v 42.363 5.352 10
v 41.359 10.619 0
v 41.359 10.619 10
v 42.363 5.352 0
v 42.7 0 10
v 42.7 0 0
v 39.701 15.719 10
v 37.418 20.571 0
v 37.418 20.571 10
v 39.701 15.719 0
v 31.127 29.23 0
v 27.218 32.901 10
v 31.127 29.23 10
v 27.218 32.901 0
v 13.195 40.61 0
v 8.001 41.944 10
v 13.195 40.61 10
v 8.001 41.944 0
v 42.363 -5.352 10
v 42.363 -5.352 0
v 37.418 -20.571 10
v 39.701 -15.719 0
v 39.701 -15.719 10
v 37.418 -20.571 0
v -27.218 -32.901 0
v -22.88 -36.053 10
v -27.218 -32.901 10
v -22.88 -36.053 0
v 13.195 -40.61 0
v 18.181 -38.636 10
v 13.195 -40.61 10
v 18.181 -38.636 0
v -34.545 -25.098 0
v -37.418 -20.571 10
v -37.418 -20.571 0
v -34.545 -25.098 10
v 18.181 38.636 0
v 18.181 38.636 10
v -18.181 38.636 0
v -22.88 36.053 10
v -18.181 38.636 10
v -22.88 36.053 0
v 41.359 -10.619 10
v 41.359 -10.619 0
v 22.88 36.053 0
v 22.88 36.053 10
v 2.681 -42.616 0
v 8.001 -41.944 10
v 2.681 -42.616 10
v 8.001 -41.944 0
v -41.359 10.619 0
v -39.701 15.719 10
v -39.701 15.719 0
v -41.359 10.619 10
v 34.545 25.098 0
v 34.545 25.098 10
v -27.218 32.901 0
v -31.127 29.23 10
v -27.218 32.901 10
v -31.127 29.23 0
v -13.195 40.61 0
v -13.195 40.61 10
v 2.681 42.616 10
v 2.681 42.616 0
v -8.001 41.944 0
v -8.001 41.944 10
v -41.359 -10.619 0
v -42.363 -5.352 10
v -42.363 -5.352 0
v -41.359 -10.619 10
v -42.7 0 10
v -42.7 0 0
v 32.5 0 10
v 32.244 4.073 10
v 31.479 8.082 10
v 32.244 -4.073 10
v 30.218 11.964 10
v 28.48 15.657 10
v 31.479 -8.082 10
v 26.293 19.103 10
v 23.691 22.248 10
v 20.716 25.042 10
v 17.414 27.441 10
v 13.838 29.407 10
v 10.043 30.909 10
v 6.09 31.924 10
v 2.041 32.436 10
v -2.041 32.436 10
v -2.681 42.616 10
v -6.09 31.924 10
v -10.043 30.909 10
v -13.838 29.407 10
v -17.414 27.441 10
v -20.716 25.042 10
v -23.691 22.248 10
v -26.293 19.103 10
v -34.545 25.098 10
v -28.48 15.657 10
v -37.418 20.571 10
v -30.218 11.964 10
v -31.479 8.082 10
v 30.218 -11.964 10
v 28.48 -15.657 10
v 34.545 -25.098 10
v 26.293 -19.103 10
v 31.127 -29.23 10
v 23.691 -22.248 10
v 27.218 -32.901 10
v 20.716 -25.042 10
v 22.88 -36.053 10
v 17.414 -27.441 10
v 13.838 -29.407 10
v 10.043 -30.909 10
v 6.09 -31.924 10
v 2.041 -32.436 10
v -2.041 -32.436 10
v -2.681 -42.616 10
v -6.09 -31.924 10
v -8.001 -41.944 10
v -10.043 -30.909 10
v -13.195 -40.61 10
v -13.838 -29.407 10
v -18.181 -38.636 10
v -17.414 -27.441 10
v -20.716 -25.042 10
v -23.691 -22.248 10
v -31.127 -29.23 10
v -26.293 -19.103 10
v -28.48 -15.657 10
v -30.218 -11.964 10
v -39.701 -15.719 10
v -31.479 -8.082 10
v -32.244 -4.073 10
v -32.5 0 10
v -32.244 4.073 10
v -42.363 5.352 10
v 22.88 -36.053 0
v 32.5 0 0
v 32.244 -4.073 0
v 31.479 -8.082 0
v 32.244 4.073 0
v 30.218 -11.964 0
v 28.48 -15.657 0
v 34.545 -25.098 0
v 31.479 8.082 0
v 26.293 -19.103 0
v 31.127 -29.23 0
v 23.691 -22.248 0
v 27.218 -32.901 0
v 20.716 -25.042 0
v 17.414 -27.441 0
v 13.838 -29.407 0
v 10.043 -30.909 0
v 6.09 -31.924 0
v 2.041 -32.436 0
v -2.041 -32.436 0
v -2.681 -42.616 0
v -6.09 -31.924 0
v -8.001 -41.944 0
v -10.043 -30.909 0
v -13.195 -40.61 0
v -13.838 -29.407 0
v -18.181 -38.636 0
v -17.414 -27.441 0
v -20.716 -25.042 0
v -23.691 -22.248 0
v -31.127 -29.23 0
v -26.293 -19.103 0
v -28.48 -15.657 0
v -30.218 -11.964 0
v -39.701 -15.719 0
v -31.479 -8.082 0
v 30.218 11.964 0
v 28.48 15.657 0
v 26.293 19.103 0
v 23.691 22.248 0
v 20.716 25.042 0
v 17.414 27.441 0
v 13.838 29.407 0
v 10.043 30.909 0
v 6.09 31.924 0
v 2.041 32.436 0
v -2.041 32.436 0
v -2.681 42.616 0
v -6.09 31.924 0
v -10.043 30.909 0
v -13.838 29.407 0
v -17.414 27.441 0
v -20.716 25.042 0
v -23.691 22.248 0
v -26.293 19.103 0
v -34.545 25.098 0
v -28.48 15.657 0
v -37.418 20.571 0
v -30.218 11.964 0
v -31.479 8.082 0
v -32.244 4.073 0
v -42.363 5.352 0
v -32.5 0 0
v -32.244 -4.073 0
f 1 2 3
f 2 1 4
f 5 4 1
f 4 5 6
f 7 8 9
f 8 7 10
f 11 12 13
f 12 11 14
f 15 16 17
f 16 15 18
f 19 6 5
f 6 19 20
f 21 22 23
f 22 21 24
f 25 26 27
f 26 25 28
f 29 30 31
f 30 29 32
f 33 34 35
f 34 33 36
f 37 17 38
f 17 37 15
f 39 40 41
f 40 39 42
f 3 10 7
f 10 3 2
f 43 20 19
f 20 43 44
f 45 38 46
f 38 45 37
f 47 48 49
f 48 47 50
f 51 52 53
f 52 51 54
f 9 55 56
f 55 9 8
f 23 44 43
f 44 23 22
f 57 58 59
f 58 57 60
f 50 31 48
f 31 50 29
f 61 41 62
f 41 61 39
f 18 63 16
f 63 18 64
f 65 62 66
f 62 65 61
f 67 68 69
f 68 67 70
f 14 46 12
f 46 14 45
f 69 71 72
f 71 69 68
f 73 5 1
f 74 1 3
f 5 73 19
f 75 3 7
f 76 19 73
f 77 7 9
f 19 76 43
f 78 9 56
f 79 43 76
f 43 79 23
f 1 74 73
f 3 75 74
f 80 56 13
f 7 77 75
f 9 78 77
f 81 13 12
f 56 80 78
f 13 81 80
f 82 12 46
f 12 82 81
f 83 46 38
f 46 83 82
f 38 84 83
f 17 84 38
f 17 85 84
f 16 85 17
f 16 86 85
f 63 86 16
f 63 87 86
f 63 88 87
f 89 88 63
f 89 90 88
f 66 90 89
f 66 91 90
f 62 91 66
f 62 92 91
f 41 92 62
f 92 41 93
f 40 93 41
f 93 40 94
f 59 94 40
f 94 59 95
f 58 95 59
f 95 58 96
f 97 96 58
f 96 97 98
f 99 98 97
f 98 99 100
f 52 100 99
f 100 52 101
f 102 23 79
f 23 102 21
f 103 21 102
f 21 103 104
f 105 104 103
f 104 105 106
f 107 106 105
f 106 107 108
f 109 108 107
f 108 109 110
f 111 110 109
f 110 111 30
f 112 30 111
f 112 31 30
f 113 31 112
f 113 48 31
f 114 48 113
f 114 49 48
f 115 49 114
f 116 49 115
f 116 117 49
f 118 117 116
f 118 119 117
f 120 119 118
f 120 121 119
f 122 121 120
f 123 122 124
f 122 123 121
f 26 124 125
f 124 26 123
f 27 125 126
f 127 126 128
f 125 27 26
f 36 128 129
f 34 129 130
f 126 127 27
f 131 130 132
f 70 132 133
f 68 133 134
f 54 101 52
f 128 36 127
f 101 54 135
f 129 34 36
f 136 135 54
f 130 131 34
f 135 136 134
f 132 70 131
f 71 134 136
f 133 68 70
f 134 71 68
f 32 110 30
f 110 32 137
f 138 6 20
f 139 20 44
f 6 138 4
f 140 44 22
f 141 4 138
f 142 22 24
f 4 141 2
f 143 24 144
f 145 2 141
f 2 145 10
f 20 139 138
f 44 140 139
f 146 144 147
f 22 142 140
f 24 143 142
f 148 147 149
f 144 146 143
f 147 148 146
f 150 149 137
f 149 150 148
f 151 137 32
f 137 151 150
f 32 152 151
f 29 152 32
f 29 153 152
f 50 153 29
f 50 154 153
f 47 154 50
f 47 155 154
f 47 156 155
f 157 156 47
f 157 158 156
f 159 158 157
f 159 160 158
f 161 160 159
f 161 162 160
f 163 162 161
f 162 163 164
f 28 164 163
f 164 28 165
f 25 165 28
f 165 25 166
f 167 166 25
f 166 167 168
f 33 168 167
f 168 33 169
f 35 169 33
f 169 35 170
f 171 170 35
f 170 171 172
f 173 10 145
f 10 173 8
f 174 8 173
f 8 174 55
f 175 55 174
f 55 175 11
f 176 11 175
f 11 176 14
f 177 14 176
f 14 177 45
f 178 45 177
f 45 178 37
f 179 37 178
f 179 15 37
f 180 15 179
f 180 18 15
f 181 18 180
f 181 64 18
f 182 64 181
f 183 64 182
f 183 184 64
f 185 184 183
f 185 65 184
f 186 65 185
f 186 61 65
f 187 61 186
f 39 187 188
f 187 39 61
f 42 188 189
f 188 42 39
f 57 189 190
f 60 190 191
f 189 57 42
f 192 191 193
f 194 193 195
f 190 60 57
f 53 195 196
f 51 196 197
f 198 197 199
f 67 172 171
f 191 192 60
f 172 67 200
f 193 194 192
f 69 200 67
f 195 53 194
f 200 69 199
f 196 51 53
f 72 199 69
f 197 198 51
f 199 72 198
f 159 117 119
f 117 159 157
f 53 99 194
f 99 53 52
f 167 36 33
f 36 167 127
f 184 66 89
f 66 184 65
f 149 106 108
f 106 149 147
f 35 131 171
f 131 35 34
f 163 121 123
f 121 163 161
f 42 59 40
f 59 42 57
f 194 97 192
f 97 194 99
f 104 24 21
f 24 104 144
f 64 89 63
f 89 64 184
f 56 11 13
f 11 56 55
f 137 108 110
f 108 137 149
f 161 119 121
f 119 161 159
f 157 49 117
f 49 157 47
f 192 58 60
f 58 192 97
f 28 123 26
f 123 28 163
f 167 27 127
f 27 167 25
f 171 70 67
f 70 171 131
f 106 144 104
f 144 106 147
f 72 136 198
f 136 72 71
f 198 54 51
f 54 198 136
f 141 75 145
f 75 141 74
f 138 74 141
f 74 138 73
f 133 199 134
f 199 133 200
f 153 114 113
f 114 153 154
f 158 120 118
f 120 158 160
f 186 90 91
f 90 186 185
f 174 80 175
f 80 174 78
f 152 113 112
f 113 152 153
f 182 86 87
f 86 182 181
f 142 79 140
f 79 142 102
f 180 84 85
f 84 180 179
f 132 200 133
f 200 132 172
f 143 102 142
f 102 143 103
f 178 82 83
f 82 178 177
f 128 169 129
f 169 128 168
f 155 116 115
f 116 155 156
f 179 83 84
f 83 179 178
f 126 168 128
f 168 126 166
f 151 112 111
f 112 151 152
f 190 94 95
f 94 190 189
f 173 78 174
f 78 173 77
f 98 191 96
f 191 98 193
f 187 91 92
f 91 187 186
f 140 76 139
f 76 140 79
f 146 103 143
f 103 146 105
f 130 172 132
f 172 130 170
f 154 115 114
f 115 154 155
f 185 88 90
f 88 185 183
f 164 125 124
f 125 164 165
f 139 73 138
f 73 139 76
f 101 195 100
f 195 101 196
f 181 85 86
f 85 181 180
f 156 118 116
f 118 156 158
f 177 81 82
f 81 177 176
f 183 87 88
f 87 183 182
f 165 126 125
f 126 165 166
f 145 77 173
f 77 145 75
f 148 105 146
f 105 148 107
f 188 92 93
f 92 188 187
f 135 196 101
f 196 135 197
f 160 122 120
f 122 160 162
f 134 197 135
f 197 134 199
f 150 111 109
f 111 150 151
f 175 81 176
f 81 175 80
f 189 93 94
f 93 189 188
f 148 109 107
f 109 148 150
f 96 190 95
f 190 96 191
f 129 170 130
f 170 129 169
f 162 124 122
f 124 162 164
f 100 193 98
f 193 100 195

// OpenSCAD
$fn = 50;


difference() {
	union() {
		cylinder(h = 10, r = 42.7000000000);
	}
	union() {
		cylinder(h = 10, r = 32.5000000000);
	}
}
